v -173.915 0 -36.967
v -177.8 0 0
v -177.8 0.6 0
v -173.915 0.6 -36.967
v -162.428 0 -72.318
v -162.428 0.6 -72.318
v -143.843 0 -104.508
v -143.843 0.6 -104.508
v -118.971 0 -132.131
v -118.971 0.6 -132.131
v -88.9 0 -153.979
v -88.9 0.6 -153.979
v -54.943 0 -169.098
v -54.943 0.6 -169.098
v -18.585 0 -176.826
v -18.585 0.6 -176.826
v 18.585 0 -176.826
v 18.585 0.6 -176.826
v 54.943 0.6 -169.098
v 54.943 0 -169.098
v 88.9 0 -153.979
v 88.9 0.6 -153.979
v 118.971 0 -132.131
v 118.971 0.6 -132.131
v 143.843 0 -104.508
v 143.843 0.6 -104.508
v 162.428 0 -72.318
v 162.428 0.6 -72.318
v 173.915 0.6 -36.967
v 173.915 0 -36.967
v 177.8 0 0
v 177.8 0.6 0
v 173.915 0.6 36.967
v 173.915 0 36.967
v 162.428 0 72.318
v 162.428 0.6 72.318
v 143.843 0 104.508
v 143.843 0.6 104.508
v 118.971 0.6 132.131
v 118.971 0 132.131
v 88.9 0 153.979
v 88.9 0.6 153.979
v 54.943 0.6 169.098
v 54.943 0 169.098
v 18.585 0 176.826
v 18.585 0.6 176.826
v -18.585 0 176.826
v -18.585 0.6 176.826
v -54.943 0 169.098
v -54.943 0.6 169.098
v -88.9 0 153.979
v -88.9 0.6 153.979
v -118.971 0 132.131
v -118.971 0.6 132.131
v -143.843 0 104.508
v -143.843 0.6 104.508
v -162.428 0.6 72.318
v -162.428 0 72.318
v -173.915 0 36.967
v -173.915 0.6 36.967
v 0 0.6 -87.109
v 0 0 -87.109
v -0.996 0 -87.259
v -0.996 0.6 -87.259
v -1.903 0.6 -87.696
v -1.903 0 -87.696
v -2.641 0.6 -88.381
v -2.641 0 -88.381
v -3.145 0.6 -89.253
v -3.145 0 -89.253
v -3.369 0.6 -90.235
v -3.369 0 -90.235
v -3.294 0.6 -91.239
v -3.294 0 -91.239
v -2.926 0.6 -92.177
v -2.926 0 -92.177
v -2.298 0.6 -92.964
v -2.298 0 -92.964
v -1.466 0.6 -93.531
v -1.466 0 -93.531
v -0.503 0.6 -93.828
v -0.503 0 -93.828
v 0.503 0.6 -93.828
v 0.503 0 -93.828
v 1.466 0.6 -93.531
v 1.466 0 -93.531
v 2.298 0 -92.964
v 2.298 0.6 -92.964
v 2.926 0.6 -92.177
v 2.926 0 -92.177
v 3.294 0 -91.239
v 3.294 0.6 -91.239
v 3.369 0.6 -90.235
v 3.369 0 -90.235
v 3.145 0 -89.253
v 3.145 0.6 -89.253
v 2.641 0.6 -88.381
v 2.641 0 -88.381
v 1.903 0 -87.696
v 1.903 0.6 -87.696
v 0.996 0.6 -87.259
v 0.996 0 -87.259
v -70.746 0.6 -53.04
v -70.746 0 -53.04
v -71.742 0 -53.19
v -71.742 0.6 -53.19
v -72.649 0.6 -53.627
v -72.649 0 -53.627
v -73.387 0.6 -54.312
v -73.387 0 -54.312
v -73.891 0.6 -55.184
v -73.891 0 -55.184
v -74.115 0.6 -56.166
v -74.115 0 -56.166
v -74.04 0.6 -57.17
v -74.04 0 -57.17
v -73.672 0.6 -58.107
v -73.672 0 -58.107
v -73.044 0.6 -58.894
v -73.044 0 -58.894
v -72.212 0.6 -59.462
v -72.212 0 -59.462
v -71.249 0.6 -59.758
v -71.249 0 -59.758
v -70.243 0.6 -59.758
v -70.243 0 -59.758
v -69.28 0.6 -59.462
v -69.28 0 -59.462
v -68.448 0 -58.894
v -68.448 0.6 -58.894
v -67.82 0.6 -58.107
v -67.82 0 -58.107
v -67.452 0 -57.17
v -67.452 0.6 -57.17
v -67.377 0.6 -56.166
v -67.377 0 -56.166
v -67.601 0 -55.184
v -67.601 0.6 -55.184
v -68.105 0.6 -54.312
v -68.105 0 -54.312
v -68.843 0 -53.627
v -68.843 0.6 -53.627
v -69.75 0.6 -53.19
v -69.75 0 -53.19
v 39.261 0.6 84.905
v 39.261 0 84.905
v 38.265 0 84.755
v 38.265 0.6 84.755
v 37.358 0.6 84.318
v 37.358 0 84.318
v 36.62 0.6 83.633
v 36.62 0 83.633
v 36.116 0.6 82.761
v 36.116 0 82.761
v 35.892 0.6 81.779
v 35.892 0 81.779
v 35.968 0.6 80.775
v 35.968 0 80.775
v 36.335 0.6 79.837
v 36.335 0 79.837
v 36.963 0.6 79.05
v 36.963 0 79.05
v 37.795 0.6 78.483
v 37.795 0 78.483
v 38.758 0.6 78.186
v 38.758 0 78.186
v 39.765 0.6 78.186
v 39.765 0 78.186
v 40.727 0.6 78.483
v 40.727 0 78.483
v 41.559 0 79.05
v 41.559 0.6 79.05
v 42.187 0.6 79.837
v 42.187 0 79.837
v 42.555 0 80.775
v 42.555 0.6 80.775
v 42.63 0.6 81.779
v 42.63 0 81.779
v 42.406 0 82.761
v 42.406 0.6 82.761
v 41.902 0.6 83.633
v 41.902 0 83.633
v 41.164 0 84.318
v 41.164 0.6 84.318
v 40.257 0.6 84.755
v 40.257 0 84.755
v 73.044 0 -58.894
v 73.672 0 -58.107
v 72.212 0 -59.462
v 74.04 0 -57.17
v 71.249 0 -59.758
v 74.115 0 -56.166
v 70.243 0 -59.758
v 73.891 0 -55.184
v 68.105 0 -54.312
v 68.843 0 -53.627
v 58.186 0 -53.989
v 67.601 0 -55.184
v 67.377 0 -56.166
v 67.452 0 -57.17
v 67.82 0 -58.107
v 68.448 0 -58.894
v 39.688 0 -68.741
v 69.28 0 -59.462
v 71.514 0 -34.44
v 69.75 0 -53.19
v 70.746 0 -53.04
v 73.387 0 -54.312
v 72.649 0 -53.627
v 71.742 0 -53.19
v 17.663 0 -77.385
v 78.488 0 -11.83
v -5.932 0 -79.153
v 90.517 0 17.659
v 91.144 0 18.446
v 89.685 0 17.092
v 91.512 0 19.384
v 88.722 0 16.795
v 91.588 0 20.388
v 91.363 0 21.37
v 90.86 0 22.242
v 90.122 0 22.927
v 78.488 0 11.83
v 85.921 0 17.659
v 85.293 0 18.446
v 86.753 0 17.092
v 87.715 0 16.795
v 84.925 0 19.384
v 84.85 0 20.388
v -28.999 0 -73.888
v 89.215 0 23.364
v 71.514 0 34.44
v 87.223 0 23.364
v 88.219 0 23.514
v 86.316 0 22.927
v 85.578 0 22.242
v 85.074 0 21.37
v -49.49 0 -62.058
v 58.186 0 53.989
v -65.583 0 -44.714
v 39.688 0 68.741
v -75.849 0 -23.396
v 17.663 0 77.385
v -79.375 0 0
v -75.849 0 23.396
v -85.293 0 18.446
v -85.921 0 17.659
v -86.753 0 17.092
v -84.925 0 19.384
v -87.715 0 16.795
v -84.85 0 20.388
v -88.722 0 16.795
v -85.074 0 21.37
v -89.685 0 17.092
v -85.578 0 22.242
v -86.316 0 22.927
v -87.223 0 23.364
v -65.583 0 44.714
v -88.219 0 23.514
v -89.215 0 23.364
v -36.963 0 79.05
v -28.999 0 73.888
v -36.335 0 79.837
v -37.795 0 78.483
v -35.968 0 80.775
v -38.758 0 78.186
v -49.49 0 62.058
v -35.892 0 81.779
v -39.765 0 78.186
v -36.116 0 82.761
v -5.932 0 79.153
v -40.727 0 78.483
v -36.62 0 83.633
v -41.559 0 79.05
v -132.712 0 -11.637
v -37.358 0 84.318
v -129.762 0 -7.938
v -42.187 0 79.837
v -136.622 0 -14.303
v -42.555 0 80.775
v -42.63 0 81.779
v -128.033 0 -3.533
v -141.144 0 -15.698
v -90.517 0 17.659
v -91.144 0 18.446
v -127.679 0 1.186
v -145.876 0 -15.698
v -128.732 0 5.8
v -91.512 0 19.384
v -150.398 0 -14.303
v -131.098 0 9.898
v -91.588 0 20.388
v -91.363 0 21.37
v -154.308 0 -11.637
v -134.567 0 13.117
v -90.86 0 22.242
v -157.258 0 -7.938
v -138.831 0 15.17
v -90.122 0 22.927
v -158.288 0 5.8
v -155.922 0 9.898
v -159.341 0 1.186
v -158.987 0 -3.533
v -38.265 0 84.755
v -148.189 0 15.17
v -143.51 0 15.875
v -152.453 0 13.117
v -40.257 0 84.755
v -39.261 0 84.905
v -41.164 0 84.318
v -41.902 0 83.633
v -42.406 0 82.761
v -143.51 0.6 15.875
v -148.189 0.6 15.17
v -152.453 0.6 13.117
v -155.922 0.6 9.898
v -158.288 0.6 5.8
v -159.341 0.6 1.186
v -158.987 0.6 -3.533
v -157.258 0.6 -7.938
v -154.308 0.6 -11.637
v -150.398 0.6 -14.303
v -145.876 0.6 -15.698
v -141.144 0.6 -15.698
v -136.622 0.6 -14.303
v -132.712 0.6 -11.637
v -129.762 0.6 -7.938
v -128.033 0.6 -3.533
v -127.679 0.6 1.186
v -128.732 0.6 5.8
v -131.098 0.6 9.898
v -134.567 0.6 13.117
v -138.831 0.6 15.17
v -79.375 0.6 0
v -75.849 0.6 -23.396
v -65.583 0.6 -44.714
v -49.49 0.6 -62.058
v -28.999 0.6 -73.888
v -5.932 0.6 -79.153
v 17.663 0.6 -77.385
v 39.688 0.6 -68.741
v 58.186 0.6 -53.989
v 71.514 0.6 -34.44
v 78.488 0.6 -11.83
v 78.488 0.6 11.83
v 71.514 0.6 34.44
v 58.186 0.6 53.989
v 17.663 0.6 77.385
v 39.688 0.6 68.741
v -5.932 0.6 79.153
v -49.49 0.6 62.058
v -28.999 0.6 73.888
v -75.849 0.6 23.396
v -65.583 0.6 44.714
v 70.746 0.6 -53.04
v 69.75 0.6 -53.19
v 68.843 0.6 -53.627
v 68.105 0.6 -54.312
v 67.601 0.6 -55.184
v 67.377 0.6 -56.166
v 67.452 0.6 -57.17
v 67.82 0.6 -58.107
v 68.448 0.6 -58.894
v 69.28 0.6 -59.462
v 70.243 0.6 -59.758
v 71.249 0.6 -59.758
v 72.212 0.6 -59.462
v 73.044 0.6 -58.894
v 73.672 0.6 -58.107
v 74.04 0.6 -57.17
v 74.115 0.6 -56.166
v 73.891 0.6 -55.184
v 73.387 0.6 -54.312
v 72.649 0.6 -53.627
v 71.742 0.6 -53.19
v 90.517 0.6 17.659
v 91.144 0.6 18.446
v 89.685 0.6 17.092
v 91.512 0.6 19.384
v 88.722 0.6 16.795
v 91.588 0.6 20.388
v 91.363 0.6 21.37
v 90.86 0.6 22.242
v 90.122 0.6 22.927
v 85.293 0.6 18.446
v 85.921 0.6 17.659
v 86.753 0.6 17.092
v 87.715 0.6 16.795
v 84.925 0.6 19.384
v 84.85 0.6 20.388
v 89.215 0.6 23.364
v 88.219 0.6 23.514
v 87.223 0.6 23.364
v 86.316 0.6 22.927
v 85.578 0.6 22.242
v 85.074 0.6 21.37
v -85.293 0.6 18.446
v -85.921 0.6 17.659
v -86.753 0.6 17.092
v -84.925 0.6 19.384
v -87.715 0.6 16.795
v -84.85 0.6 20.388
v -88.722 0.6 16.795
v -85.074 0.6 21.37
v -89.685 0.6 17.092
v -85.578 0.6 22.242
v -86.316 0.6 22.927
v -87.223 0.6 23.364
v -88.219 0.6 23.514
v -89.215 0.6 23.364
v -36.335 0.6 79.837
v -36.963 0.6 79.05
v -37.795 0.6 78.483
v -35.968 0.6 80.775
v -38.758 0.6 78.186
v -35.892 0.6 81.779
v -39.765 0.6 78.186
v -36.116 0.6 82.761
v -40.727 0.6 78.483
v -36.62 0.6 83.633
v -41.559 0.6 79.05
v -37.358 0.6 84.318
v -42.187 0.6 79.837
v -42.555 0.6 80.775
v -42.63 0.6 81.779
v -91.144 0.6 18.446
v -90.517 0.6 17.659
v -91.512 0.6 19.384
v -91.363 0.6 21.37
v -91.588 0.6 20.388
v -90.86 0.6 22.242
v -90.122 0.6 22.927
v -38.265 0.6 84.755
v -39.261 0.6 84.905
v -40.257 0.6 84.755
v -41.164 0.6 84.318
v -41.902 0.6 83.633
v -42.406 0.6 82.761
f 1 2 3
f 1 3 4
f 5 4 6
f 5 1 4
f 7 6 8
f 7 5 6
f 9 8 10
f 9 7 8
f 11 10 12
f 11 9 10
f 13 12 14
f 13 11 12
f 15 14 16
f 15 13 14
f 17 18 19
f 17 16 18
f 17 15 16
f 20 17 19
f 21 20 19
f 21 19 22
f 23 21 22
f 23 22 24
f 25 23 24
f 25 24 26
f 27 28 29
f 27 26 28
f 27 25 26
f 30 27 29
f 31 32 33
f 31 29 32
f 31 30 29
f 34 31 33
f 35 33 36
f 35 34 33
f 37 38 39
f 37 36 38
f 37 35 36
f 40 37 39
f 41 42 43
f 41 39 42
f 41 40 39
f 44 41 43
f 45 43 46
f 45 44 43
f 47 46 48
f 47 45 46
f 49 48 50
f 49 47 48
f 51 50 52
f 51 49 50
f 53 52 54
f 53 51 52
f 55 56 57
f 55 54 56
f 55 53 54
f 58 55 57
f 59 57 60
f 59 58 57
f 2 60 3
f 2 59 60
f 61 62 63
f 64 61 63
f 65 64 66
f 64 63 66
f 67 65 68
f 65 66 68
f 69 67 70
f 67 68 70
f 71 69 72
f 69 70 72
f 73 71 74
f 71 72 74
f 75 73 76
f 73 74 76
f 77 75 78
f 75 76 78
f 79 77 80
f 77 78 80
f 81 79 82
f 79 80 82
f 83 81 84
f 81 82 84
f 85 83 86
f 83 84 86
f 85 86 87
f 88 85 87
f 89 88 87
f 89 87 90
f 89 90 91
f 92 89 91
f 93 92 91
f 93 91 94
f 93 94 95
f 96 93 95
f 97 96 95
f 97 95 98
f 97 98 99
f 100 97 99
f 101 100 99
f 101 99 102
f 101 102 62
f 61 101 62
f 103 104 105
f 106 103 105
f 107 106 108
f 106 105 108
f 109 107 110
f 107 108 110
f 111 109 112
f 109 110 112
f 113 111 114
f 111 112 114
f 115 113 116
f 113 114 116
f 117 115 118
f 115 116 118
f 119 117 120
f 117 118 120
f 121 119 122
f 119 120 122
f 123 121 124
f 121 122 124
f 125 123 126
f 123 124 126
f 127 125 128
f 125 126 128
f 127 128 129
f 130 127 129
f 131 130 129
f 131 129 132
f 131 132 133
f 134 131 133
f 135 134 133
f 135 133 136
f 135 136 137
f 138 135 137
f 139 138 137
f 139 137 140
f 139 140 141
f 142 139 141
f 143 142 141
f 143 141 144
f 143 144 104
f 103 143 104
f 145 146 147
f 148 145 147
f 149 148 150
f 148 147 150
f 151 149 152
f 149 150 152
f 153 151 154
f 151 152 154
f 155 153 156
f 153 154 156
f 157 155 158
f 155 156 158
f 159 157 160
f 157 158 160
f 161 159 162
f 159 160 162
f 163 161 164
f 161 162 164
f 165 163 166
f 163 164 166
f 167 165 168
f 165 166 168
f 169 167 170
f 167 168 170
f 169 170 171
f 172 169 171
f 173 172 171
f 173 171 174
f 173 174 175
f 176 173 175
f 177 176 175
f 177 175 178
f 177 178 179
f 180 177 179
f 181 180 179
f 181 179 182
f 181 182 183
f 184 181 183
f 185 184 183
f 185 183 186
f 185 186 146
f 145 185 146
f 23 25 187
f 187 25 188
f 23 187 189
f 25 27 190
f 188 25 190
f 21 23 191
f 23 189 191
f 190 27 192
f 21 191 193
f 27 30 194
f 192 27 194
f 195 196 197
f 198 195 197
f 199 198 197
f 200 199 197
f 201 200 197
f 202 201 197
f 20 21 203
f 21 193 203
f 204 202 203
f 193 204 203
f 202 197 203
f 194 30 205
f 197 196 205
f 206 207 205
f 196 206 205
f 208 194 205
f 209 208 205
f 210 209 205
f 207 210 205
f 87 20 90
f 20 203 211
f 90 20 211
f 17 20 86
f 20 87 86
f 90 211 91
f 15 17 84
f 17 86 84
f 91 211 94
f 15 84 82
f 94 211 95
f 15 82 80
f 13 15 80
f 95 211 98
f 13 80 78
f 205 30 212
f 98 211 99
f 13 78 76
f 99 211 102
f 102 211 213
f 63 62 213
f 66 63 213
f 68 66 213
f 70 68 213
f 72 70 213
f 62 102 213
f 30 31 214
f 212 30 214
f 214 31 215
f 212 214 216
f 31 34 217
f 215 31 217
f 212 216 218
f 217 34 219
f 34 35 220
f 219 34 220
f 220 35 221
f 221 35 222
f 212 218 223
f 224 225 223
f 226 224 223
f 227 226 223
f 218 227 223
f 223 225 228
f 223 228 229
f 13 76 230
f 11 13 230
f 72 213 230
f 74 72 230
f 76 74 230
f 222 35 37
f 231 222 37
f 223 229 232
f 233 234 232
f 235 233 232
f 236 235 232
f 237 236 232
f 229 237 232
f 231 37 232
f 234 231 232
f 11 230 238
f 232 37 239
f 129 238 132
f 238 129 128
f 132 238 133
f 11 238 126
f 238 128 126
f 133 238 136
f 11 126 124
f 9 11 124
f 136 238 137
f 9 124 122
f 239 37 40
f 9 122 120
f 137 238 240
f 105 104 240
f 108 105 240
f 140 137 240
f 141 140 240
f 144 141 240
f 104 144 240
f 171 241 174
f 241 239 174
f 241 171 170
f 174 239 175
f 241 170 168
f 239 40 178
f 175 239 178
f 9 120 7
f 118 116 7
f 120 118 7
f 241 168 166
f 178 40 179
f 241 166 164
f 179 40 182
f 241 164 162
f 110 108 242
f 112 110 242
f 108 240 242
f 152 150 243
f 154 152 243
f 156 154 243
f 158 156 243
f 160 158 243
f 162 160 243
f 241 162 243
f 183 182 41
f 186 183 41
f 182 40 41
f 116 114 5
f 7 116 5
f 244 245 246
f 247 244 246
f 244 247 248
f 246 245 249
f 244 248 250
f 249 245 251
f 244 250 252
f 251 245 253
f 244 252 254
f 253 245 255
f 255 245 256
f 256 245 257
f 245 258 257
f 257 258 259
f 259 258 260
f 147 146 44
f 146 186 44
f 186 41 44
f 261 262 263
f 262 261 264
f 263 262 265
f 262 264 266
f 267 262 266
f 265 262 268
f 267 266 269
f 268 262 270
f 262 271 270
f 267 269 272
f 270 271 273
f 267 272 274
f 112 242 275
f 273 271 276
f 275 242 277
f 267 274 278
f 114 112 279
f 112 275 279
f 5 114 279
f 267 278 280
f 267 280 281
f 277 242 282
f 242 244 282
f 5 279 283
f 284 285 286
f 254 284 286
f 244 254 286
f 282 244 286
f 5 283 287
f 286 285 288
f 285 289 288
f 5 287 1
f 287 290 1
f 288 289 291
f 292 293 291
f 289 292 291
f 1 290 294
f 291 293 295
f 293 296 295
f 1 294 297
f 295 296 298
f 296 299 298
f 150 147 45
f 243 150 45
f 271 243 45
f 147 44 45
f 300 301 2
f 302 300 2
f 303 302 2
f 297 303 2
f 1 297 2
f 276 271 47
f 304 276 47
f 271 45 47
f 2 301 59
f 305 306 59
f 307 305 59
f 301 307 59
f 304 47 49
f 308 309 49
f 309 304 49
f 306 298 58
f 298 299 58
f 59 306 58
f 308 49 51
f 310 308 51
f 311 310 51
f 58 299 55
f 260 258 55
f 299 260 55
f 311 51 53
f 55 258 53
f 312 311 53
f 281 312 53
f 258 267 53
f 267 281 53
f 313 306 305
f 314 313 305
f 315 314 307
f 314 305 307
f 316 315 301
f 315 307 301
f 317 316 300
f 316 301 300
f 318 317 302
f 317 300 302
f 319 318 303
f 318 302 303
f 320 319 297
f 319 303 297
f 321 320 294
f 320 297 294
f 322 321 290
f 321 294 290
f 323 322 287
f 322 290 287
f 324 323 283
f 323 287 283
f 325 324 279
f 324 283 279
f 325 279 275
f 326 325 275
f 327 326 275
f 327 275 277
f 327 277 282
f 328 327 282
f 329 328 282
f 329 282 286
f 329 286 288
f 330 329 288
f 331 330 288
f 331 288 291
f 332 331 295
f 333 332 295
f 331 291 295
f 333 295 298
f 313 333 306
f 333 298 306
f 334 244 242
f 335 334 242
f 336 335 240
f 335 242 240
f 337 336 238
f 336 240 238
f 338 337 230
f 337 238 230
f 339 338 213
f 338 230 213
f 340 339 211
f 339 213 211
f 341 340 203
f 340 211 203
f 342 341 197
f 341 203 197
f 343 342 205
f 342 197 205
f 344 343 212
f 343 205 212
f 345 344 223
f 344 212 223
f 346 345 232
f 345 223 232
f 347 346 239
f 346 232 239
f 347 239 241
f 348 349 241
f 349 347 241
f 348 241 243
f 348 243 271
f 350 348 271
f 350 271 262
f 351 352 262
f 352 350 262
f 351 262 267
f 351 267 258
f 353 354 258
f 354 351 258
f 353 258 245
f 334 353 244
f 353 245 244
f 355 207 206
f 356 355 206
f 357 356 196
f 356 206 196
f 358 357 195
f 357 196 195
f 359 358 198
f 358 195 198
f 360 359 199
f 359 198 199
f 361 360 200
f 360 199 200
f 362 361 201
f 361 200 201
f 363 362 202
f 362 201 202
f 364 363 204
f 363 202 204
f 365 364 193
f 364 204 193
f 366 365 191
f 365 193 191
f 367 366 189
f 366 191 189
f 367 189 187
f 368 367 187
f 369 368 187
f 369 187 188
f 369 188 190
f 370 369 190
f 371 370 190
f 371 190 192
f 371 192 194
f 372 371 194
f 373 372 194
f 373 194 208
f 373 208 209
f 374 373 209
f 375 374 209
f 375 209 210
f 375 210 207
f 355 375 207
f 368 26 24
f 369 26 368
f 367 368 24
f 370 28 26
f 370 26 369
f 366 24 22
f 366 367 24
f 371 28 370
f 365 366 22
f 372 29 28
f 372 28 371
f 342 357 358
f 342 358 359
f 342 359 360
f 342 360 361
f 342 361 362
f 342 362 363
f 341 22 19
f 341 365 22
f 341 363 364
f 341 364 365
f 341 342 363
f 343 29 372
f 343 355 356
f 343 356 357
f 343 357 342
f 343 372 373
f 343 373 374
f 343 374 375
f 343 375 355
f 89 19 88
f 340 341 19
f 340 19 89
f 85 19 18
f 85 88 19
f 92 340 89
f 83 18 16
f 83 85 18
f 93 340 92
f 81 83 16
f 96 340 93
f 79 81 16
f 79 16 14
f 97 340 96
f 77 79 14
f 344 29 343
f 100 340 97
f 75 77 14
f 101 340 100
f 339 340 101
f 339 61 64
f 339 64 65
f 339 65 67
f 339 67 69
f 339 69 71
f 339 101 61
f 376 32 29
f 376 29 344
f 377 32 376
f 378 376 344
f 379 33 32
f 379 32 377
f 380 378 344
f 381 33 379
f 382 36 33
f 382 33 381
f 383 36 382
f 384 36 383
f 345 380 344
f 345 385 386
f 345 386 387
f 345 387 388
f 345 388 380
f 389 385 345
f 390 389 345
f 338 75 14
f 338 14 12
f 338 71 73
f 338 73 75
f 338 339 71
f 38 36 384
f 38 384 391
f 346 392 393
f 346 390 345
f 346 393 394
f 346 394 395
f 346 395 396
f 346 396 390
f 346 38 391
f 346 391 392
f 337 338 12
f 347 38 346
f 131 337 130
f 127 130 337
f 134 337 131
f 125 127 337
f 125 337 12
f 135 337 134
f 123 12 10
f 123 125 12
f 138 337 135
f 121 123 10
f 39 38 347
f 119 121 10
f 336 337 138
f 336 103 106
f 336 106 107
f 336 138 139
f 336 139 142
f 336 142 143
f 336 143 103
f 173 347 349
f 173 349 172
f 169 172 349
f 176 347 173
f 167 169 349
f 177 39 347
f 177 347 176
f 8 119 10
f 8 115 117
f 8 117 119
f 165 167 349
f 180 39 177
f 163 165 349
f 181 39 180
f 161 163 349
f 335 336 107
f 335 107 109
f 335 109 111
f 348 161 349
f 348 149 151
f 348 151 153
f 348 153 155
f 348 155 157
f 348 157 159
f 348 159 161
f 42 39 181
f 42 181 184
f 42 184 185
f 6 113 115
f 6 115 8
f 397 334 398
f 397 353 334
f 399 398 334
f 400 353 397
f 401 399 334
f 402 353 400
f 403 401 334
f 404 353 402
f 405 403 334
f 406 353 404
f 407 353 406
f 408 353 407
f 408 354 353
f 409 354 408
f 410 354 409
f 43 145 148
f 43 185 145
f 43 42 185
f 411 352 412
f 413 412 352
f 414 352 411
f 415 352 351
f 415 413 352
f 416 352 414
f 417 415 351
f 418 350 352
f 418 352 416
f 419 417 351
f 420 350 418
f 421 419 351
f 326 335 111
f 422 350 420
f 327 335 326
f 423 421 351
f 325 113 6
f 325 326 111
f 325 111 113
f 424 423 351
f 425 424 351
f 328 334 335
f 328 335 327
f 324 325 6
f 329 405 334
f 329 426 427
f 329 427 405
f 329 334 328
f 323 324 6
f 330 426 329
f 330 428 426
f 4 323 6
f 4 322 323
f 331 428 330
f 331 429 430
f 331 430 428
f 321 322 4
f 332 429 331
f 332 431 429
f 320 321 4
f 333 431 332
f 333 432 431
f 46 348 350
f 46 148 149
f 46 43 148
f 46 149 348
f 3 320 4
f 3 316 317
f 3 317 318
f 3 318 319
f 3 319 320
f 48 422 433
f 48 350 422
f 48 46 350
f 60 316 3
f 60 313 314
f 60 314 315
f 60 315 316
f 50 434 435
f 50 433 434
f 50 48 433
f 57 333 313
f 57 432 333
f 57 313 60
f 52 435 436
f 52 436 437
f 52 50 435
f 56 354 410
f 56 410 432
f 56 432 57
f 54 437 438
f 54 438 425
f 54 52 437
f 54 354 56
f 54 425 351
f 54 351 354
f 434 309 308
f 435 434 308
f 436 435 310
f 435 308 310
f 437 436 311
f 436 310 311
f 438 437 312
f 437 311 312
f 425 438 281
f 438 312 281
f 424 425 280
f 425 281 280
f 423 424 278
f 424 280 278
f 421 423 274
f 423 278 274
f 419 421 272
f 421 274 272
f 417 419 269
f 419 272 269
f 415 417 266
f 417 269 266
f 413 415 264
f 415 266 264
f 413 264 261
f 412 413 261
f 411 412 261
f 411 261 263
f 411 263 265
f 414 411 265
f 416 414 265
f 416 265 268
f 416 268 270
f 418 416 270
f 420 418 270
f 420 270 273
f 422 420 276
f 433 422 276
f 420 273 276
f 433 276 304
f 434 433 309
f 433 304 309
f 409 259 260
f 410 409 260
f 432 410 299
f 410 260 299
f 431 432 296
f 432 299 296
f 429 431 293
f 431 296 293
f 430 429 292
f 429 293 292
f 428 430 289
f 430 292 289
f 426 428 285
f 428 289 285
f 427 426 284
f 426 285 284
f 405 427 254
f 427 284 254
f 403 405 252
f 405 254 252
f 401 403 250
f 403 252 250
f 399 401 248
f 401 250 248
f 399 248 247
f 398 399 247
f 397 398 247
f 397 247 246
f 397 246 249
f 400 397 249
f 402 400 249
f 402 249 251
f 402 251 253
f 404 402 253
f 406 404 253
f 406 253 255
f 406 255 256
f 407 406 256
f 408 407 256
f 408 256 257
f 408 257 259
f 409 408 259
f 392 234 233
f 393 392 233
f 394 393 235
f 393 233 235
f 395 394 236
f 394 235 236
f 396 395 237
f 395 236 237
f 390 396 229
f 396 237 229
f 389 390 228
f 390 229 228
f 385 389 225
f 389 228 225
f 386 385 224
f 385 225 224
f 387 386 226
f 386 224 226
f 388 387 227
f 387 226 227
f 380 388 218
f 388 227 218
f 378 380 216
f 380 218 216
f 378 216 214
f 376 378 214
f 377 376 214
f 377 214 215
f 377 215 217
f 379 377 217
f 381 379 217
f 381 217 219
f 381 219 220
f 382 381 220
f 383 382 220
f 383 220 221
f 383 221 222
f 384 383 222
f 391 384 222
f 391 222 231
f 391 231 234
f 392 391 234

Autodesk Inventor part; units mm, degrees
ref_plane "YZ Plane" through (0, 0, 0) normal (1, 0, 0) x (0, 1, 0)
ref_plane "XZ Plane" through (0, 0, 0) normal (0, 1, 0) x (-1, 0, 0)
ref_plane "XY Plane" through (0, 0, 0) normal (0, 0, 1) x (1, 0, 0)
sketch "Sketch1" plane through (0, 0, 0) normal (0, 1, 0) x (-1, 0, 0)
  circle A0 centre (0, 0) radius 79.375
  circle A1 centre (0, 0) radius 177.8
  dimension "d0" = 158.75
  dimension "d1" = 355.6
extrude "Extrusion1" add sketch "Sketch1" along normal blind 0.6
sketch "Sketch2" plane through (0, 0.6, 0) normal (0, 1, 0) x (1, 0, 0)
  point P0 (0, 0)
  point P1 (0, 90.4875)
  point P2 (-70.746, 56.418)
  point P3 (-88.2188, -20.1354)
  point P4 (-39.2611, -81.5264)
  point P5 (39.2611, -81.5264)
  point P6 (88.2188, -20.1354)
  point P7 (70.746, 56.418)
  dimension "d4" = 90.4875
  dimension "d7" = 360
hole "Hole1" at (0, 0.6, -90.4875) at (-70.746, 0.6, -56.418) at (-88.2188, 0.6, 20.1354) at (-39.2611, 0.6, 81.5264) at (39.2611, 0.6, 81.5264) at (88.2188, 0.6, 20.1354) at (70.746, 0.6, -56.418) direction (0, -1, 0) diameter 6.7564 end through all clearance for "Hex Machine Screw" size "1/4" standard "Ansi Unified Screw Threads"
sketch "Sketch3" plane through (0, 0.6, 0) normal (0, 1, 0) x (1, 0, 0)
  point P0 (0, 0)
  point P1 (-143.51, 0)
  dimension "d16" = 143.51
hole "Hole2" at (-143.51, 0.6, 0) direction (0, -1, 0) diameter 31.75 end through all
properties part number "3DPRINT,WIRE-GUARD"
